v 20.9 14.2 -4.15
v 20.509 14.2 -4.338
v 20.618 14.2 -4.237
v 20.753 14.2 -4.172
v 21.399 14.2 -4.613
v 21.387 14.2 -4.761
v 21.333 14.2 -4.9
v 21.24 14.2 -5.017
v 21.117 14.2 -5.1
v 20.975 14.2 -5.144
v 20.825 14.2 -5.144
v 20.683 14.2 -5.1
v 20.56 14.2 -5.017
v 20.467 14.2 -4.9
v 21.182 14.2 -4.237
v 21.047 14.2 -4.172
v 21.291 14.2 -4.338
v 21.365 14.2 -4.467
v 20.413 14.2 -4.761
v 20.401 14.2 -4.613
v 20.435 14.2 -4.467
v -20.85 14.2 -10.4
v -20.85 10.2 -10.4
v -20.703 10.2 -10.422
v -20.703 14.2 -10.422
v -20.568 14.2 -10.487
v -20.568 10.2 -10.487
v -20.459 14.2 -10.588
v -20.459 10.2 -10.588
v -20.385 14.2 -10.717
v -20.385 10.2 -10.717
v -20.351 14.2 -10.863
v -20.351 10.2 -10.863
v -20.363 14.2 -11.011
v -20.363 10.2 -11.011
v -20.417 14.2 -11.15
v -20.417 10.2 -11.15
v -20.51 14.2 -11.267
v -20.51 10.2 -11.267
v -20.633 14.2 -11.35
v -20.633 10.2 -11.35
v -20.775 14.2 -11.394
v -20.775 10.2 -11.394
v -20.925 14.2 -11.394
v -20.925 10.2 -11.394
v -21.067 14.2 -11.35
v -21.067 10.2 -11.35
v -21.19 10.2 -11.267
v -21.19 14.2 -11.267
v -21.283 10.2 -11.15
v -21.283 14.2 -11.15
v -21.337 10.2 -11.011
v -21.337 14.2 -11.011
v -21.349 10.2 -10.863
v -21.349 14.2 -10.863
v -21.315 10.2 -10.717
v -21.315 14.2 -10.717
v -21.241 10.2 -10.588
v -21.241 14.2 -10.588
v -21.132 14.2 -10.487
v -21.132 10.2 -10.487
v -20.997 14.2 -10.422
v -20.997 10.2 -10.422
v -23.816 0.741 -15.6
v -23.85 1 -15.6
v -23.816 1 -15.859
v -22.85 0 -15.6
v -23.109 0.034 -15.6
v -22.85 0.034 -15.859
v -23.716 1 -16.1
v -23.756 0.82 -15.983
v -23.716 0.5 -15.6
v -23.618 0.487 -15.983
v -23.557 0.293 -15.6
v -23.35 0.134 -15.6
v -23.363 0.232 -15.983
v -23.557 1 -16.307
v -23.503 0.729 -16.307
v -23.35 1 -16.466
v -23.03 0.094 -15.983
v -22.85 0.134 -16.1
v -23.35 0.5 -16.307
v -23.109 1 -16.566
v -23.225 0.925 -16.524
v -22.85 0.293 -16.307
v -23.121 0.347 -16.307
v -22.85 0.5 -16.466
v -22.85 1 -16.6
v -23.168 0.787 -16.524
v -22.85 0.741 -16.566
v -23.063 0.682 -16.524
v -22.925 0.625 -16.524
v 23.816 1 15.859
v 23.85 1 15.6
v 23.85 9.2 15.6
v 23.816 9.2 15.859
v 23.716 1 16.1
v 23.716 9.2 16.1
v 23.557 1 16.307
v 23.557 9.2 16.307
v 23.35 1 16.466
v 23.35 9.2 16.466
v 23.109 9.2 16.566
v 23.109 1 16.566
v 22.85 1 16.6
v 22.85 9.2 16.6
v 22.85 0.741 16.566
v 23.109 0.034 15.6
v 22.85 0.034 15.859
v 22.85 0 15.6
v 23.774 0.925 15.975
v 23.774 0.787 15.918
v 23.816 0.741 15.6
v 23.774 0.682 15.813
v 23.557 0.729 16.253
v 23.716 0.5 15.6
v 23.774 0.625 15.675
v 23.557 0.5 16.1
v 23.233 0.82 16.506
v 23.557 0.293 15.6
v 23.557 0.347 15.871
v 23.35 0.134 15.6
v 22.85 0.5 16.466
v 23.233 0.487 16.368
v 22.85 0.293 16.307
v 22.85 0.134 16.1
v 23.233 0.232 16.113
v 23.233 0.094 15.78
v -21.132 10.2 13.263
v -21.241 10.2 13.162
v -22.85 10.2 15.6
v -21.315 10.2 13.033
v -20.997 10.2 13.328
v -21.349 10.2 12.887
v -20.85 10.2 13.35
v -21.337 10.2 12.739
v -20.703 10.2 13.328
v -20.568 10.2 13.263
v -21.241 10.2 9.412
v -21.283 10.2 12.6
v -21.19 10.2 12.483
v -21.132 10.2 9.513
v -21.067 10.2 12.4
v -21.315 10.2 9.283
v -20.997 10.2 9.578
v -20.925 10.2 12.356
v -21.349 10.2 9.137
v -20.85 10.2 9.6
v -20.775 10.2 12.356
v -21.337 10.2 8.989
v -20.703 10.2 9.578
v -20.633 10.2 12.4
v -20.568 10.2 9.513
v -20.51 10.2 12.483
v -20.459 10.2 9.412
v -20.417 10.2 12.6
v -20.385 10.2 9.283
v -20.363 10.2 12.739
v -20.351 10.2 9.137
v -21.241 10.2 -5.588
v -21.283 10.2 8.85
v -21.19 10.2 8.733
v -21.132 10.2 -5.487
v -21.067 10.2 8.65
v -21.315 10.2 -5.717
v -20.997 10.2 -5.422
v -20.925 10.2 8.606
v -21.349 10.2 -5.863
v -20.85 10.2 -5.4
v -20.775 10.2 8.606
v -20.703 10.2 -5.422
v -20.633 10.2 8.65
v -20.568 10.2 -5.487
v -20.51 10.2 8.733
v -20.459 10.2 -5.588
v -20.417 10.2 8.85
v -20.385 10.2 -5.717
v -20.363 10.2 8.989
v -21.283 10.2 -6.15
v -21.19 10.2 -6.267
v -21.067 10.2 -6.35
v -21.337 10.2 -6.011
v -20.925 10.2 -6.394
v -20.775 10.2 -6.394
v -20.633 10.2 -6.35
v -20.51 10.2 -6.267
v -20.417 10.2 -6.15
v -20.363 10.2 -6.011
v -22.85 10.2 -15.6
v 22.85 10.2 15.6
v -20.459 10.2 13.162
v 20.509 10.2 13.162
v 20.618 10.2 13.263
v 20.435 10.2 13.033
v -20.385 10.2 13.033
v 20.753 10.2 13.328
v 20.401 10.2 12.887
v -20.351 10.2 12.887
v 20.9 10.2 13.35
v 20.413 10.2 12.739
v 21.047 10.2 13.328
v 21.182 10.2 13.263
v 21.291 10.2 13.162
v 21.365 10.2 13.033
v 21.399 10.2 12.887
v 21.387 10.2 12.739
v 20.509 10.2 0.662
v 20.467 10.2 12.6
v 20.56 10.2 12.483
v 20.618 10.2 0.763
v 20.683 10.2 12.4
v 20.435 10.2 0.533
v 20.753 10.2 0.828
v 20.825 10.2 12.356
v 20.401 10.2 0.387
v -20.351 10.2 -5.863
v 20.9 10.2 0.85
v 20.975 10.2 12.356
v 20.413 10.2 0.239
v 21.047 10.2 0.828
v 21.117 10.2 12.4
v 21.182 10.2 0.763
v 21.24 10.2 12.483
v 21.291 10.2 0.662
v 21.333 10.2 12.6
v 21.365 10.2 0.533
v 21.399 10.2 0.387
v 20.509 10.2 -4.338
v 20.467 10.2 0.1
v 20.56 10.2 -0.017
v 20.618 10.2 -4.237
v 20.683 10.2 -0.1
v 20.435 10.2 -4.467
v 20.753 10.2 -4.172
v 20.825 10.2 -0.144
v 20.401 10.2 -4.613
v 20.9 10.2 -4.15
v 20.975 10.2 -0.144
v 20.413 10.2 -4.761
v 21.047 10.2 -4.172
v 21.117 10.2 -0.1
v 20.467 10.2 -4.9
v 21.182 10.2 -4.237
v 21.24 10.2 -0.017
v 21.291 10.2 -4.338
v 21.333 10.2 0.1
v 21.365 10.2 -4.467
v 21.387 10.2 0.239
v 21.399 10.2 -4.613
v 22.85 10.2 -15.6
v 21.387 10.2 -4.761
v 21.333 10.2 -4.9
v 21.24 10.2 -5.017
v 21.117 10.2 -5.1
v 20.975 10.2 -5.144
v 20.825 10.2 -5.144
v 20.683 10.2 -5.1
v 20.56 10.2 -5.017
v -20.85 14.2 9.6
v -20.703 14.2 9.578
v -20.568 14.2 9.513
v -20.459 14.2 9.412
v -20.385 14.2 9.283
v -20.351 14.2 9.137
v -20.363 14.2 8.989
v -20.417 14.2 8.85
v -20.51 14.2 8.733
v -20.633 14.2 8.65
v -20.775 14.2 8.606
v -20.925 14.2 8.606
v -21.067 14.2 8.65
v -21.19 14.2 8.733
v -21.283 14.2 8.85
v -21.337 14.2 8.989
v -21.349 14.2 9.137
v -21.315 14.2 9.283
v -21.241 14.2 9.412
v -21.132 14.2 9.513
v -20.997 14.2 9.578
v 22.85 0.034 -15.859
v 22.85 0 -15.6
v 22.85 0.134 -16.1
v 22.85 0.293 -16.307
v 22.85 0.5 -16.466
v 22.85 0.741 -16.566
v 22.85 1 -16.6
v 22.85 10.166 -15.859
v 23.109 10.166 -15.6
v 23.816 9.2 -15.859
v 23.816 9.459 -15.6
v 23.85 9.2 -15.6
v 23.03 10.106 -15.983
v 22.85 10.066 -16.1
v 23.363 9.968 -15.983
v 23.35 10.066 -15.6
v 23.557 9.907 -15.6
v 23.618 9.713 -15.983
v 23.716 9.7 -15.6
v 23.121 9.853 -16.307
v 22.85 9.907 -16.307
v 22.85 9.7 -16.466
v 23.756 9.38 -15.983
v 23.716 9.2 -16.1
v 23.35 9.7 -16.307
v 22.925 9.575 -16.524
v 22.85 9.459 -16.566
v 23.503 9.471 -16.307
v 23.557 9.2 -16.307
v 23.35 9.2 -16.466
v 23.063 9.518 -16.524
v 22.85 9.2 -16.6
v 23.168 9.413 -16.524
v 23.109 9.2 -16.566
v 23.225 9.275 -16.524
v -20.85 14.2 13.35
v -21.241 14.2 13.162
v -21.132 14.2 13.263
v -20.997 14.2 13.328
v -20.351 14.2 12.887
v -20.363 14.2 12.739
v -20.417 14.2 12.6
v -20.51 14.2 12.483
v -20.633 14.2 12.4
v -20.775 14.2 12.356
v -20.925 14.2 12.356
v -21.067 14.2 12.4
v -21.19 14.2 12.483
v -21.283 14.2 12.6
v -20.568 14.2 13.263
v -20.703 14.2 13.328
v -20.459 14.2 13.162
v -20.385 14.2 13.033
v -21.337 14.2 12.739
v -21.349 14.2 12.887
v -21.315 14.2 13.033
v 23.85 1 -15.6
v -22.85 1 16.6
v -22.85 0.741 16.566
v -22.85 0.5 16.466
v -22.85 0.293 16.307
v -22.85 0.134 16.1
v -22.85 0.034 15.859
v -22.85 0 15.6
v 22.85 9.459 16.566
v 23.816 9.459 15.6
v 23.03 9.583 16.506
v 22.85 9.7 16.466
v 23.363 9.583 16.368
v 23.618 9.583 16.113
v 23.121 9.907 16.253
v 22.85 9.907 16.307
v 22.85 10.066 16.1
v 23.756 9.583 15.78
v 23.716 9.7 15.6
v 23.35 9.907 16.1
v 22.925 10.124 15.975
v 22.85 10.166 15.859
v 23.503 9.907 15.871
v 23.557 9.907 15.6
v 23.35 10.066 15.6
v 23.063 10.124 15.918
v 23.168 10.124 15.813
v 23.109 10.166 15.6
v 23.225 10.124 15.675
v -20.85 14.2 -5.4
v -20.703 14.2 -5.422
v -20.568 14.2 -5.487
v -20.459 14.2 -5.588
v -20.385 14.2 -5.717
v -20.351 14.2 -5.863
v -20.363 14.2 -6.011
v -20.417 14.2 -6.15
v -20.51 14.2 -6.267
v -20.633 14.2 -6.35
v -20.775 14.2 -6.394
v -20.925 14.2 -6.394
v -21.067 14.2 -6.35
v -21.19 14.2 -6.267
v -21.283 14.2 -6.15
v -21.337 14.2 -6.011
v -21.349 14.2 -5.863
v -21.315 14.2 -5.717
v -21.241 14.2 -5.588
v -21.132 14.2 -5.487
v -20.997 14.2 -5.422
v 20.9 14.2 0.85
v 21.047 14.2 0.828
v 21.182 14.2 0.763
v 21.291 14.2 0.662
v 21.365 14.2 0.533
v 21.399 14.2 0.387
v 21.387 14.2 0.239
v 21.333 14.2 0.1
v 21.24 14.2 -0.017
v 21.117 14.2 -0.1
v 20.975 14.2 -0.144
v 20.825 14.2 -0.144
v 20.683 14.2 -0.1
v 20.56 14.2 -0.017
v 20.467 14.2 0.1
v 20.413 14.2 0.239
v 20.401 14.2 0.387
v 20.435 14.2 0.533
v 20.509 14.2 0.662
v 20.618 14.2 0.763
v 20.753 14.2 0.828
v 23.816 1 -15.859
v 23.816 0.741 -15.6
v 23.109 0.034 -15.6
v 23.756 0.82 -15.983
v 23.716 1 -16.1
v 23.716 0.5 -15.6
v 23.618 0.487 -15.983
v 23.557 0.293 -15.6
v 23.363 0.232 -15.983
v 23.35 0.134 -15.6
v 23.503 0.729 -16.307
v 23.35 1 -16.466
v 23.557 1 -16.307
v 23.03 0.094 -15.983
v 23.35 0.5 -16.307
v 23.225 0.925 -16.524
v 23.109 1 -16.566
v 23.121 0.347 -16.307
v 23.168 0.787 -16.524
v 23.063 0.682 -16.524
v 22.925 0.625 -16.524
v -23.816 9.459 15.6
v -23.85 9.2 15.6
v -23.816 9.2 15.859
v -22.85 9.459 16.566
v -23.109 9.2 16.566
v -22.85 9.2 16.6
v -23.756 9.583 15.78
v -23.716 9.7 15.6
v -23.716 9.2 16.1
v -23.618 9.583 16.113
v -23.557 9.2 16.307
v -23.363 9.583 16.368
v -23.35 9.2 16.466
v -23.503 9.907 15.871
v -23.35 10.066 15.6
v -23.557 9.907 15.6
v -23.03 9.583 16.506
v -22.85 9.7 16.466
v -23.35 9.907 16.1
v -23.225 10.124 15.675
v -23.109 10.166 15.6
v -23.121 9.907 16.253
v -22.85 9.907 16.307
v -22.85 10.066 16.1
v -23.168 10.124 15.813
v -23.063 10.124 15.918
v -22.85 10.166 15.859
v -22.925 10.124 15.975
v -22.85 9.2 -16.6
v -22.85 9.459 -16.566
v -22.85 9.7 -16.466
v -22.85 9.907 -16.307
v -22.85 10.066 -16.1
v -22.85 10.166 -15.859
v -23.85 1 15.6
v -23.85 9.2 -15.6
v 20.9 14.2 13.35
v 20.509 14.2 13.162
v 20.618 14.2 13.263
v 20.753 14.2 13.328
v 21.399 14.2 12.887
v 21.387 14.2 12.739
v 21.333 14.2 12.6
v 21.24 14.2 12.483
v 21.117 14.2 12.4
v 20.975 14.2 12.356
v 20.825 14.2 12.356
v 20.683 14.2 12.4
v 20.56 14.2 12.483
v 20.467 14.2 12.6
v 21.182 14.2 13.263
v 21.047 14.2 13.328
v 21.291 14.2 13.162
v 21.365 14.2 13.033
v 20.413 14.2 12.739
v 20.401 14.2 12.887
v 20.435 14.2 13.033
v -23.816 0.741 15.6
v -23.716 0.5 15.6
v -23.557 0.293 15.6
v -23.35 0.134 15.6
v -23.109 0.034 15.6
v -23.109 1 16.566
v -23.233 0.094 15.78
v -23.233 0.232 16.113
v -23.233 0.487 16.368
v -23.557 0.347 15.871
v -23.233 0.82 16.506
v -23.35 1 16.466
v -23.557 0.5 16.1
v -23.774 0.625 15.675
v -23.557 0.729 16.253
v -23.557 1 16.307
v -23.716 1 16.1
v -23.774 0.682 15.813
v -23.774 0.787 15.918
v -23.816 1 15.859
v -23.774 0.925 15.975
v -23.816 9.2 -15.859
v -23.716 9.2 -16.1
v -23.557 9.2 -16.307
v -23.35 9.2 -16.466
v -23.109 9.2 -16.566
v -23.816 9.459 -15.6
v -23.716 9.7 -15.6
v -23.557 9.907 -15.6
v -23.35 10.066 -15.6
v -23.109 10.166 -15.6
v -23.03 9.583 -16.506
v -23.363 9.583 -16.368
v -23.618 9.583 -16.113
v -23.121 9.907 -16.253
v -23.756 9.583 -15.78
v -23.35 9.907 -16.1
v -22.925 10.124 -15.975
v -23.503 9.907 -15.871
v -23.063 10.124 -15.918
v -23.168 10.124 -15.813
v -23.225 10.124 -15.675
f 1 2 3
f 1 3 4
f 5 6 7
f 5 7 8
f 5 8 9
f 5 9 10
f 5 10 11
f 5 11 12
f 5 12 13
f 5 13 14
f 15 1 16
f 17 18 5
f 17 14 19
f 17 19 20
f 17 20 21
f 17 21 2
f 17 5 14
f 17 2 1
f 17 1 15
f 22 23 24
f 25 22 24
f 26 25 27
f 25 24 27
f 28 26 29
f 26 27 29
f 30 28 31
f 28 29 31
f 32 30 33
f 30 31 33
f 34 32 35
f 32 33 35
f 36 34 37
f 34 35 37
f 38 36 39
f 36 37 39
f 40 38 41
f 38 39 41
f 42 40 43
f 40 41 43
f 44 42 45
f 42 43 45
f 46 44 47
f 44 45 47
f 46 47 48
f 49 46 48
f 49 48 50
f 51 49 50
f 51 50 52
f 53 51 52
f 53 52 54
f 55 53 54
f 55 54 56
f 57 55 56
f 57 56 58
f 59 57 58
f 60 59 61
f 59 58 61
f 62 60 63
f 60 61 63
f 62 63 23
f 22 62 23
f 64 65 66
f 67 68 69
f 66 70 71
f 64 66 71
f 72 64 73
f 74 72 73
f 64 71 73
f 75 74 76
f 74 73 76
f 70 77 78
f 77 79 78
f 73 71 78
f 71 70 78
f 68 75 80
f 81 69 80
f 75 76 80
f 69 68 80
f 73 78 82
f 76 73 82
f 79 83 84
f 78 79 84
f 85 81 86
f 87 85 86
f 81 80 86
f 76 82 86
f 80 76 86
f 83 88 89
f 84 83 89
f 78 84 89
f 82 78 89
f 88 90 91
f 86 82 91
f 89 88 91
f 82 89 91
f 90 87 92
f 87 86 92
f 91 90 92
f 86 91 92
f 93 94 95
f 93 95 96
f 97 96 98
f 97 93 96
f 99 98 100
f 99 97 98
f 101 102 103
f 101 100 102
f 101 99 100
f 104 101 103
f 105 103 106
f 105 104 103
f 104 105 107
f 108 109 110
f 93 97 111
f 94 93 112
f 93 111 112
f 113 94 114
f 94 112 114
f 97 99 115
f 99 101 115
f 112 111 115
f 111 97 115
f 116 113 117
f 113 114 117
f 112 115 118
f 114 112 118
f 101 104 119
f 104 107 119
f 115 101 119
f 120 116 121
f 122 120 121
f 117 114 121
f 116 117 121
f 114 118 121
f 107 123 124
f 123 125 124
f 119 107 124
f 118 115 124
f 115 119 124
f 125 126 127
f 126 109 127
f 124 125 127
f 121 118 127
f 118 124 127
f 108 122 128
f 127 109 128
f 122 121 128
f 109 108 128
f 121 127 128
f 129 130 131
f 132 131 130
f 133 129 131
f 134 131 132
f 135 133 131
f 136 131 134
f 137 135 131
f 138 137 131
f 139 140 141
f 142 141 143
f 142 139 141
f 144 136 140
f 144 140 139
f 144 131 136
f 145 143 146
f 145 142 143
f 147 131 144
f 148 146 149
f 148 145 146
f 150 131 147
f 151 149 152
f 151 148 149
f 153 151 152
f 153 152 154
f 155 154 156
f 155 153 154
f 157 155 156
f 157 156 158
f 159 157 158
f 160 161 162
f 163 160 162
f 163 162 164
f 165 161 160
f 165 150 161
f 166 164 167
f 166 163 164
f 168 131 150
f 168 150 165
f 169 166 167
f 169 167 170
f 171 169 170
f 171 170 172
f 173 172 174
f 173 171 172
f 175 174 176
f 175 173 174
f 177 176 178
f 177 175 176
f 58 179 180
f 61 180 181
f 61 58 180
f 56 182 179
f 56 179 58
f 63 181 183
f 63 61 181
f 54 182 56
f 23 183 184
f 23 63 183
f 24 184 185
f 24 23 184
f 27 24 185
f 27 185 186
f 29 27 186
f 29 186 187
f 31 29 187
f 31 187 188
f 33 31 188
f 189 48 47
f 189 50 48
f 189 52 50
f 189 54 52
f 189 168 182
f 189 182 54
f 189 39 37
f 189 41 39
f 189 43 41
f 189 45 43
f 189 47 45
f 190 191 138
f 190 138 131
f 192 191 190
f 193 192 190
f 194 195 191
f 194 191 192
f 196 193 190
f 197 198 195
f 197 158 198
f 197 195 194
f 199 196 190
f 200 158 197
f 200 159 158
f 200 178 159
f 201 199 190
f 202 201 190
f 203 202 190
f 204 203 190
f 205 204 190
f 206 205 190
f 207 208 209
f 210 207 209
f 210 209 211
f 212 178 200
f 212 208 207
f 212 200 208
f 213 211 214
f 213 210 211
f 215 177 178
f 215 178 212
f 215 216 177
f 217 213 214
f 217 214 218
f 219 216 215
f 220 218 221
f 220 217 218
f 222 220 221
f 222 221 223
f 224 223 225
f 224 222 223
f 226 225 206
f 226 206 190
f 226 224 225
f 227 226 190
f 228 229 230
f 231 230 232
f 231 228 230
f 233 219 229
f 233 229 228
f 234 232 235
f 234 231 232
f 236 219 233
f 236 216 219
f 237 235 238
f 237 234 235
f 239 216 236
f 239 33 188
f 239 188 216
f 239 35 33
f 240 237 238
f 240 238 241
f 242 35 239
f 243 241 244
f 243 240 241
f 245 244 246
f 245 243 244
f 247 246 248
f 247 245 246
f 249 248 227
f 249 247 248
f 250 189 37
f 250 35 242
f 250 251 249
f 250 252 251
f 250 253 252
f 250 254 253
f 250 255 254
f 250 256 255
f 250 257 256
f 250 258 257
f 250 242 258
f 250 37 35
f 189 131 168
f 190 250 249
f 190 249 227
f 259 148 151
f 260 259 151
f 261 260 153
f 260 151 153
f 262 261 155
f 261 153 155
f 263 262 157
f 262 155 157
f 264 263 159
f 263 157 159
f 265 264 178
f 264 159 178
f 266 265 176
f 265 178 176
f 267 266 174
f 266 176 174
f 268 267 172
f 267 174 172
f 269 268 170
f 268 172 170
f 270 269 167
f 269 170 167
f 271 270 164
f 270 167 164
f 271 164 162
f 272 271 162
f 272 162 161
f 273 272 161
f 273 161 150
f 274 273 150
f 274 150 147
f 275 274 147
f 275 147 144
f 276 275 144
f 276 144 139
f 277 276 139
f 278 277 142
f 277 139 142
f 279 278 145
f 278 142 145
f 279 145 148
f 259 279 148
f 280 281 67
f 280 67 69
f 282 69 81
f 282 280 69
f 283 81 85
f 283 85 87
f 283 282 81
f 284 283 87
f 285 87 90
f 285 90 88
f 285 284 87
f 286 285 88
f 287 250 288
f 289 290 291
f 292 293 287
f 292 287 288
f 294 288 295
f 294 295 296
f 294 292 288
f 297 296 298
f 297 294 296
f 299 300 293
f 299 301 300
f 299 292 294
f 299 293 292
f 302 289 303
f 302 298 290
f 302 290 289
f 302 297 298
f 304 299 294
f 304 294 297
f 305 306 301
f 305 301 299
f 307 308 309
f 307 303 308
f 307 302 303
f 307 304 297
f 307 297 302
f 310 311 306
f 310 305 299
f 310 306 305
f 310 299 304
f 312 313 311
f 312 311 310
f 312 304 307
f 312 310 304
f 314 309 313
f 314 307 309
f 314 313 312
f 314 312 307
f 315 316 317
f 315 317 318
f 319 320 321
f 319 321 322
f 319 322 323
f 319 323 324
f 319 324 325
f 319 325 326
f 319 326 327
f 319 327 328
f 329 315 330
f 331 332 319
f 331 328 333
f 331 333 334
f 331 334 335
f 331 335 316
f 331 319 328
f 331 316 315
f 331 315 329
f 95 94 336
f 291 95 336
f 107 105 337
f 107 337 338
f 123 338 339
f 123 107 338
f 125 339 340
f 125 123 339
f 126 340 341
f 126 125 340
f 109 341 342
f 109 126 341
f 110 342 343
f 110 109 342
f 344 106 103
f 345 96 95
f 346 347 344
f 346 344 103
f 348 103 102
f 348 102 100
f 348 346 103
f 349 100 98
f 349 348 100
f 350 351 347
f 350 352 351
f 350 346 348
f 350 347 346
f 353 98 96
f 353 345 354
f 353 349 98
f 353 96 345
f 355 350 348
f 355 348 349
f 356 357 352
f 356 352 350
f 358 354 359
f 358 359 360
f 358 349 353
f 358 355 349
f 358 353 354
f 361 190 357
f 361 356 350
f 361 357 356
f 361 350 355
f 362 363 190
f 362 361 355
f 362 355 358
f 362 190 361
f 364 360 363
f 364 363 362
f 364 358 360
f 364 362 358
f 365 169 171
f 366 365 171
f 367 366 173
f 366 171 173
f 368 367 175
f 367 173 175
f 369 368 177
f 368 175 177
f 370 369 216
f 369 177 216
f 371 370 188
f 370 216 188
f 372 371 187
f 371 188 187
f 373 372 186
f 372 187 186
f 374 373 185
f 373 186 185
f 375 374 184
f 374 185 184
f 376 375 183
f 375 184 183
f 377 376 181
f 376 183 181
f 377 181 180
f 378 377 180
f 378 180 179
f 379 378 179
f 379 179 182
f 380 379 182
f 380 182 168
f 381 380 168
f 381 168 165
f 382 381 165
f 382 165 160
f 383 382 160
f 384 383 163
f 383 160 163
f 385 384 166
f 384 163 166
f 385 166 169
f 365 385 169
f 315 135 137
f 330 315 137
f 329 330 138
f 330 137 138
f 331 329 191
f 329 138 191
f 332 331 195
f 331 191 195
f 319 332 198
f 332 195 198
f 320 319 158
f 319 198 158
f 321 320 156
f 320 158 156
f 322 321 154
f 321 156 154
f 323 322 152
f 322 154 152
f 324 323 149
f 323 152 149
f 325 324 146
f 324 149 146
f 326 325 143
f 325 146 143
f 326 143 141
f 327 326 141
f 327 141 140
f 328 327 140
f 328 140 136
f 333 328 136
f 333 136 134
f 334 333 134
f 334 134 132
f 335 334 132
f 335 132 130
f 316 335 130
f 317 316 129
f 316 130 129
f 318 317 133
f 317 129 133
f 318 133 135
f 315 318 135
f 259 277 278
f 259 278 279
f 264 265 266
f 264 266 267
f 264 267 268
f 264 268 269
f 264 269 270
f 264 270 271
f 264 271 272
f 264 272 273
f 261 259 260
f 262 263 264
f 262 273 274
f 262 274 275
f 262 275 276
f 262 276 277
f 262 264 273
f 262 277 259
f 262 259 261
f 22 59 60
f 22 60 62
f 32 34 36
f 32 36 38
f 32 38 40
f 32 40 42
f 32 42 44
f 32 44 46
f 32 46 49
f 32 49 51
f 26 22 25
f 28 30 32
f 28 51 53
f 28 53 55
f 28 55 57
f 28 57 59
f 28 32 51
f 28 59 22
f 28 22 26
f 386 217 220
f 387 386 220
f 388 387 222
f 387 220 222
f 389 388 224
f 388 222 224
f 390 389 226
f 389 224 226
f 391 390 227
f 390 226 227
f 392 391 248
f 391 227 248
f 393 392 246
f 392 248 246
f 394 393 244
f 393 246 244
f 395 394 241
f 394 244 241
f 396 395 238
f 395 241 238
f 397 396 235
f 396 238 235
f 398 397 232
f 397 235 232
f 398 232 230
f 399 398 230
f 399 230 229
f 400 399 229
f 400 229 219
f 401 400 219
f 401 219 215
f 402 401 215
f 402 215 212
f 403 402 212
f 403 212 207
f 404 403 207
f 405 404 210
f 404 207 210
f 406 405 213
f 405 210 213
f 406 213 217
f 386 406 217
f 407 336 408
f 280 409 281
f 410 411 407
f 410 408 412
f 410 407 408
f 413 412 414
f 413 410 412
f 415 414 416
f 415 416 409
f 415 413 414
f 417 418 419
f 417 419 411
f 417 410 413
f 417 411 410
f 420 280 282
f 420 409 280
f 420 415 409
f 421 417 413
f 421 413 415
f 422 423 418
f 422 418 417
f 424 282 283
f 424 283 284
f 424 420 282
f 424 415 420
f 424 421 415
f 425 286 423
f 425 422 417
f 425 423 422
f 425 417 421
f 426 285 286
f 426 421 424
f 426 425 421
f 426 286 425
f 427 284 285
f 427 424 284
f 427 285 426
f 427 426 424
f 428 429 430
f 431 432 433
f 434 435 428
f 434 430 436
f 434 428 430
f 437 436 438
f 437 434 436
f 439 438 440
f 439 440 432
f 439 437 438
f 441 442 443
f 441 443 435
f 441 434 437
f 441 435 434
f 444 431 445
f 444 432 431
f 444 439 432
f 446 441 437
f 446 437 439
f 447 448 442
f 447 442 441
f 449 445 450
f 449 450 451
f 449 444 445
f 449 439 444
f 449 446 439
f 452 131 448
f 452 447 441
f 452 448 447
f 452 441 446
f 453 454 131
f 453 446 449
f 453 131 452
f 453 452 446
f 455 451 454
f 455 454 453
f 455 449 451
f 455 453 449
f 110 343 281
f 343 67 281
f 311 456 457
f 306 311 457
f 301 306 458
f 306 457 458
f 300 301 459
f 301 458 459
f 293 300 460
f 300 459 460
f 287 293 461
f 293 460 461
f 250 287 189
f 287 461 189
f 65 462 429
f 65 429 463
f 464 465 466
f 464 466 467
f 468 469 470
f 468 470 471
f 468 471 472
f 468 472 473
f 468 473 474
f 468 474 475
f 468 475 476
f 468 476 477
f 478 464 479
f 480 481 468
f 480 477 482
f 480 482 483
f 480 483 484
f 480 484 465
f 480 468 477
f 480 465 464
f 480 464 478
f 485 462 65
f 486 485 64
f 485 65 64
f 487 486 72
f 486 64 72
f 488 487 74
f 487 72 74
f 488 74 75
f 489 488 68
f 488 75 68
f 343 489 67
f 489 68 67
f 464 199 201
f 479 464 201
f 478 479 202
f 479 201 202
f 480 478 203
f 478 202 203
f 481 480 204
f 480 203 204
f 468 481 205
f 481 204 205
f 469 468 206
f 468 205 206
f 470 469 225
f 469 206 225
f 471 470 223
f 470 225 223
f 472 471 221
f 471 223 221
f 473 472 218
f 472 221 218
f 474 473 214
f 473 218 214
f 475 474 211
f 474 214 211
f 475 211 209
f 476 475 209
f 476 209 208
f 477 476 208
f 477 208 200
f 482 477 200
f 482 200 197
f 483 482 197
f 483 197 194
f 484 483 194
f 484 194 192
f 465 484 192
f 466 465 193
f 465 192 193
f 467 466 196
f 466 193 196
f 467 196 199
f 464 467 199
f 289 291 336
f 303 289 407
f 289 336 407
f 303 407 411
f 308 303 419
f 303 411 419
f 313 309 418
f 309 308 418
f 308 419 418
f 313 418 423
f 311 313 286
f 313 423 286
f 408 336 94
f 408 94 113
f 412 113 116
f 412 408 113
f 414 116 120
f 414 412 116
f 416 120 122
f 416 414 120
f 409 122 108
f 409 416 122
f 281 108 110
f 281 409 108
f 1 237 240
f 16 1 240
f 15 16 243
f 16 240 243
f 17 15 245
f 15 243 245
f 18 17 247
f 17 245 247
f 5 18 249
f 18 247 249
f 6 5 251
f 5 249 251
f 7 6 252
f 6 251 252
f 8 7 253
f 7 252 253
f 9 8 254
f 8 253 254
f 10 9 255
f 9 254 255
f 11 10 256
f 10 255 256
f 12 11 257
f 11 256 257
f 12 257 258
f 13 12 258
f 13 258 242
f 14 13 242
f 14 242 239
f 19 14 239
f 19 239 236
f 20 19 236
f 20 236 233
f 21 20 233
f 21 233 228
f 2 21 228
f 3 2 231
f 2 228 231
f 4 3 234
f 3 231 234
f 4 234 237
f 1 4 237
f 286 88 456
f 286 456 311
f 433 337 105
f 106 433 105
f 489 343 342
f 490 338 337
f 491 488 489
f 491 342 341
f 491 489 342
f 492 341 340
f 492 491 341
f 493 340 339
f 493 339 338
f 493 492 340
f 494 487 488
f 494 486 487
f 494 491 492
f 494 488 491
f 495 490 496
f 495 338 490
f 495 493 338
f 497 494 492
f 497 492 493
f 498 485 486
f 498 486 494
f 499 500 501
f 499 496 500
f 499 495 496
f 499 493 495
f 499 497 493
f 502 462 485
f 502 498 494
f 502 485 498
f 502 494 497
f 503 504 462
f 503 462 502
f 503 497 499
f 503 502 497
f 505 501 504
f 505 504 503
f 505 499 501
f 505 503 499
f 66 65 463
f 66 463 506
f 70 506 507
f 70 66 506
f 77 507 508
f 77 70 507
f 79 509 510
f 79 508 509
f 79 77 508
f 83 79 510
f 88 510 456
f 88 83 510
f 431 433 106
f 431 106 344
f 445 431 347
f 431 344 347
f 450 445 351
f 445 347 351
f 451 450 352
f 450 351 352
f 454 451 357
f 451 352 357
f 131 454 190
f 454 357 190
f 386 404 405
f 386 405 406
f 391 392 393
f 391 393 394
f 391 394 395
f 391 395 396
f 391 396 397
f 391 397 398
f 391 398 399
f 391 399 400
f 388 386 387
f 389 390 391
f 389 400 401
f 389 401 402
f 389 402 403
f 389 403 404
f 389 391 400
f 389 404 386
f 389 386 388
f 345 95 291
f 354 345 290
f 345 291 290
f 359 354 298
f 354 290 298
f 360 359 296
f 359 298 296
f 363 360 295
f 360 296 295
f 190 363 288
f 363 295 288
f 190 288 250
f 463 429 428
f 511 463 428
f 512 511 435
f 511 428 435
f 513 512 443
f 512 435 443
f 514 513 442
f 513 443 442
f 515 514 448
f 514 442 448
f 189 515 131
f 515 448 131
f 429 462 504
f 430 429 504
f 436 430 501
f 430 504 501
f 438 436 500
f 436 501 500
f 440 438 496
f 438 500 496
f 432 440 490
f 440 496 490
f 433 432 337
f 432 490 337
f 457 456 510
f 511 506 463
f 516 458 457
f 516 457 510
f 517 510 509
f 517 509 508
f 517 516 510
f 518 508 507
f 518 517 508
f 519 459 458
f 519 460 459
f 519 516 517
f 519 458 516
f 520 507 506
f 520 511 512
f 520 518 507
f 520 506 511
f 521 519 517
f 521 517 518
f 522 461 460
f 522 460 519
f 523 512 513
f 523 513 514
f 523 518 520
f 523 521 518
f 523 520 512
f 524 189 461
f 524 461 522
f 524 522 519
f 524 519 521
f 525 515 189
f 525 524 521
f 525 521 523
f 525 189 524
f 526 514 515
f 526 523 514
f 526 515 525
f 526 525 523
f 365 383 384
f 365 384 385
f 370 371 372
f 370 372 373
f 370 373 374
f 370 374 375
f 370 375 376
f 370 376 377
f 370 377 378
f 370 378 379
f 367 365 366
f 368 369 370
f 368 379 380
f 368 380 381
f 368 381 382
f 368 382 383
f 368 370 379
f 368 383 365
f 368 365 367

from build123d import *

# Parameters (mm, degrees)
SKETCH_1_W      = 47.7
SKETCH_1_H      = 33.2
EXTRUDE_1_DEPTH = 10.2
SKETCH_2_R      = 0.5
EXTRUDE_2_DEPTH = 4
FILLET_1_R      = 1
FILLET_2_R      = 1
FILLET_3_R      = 1
FILLET_4_R      = 1


with BuildPart() as part:
    # Эскиз1 → Бобышка-Вытянуть1 (new body)
    with BuildSketch(Plane(origin=(0, 0, 0), x_dir=(1, 0, 0), z_dir=(0, 1, 0))):
        Rectangle(SKETCH_1_W, SKETCH_1_H)
    extrude(amount=EXTRUDE_1_DEPTH)

    # Эскиз2 → Бобышка-Вытянуть2 (add)
    with BuildSketch(Plane(origin=(0, 10.2, 0), x_dir=(1, 0, 0), z_dir=(0, 1, 0))):
        with Locations(Location((-20.85, 5.9, 0), (0, 0, 270))):
            Circle(SKETCH_2_R)
        with Locations(Location((-20.85, 10.9, 0), (0, 0, 270))):
            Circle(SKETCH_2_R)
        with Locations(Location((-20.85, -12.85, 0), (0, 0, 270))):
            Circle(SKETCH_2_R)
        with Locations(Location((-20.85, -9.1, 0), (0, 0, 270))):
            Circle(SKETCH_2_R)
        with Locations(Location((20.9, -12.85, 0), (0, 0, 270))):
            Circle(SKETCH_2_R)
        with Locations(Location((20.9, -0.35, 0), (0, 0, 270))):
            Circle(SKETCH_2_R)
        with Locations(Location((20.9, 4.65, 0), (0, 0, 270))):
            Circle(SKETCH_2_R)
    extrude(amount=EXTRUDE_2_DEPTH)

    # Скругление1
    fillet_1_edges = [part.edges().sort_by_distance(p)[0] for p in [
        (0, 0, 16.6),
        (-23.85, 0, 0),
    ]]
    fillet(fillet_1_edges, radius=FILLET_1_R)

    # Скругление2
    fillet_2_edges = [part.edges().sort_by_distance(p)[0] for p in [
        (23.85, 0, -0.5),
        (-23.557106781, 0.292893219, -16.6),
        (23.85, 0.292893219, 16.307106781),
        (0.5, 0, -16.6),
        (23.85, 5.6, 16.6),
        (-23.85, 5.6, -16.6),
    ]]
    fillet(fillet_2_edges, radius=FILLET_2_R)

    # Скругление3
    # the kernel refuses this fillet: 1 mm, written as the material it takes off along each edge
    with BuildSketch(Plane(origin=(-22.85, 1, 15.6), x_dir=(0, 0, 1), z_dir=(-1, 0, 0))) as fillet_3_piece_1_section:
        Polygon((0, 0), (FILLET_3_R, 0), (FILLET_3_R, -FILLET_3_R), (0, -FILLET_3_R), align=None)
    fillet_3_piece_1 = extrude(amount=FILLET_3_R, mode=Mode.PRIVATE)
    fillet_3_piece_1 = fillet_3_piece_1 - Plane(origin=(-22.85, 1, 15.6), x_dir=(0, 0.7071067811865475, -0.7071067811865475), z_dir=(-1, 0, 0)) * Sphere(FILLET_3_R, mode=Mode.PRIVATE)
    add(fillet_3_piece_1, mode=Mode.SUBTRACT)
    with BuildSketch(Plane(origin=(-22.85, 9.2, 15.6), x_dir=(-1, 0, 0), z_dir=(0, 1, 0))) as fillet_3_piece_2_section:
        Polygon((0, 0), (FILLET_3_R, 0), (FILLET_3_R, FILLET_3_R), (0, FILLET_3_R), align=None)
    fillet_3_piece_2 = extrude(amount=FILLET_3_R, mode=Mode.PRIVATE)
    fillet_3_piece_2 = fillet_3_piece_2 - Plane(origin=(-22.85, 9.2, 15.6), x_dir=(0.7071067811865475, 0, -0.7071067811865475), z_dir=(0, 1, 0)) * Sphere(FILLET_3_R, mode=Mode.PRIVATE)
    add(fillet_3_piece_2, mode=Mode.SUBTRACT)
    with BuildSketch(Plane(origin=(22.85, 10.2, 16.6), x_dir=(0, 0, -1), z_dir=(-1, 0, 0))) as fillet_3_piece_3:
        with BuildLine():
            CenterArc((FILLET_3_R, FILLET_3_R), FILLET_3_R, 180, 90)
            Line((0, FILLET_3_R), (0, 0))
            Line((0, 0), (FILLET_3_R, 0))
        make_face()
    extrude(amount=45.7, mode=Mode.SUBTRACT)
    with BuildSketch(Plane(origin=(23.85, 10.2, -19.1), x_dir=(-1, 0, 0), z_dir=(0, 0, 1))) as fillet_3_piece_4:
        with BuildLine():
            CenterArc((FILLET_3_R, FILLET_3_R), FILLET_3_R, 180, 90)
            Line((0, FILLET_3_R), (0, 0))
            Line((0, 0), (FILLET_3_R, 0))
        make_face()
    extrude(amount=34.7, mode=Mode.SUBTRACT)
    with BuildSketch(Plane(origin=(-23.85, 10.2, 15.6), x_dir=(1, 0, 0), z_dir=(0, 0, -1))) as fillet_3_piece_5:
        with BuildLine():
            CenterArc((FILLET_3_R, FILLET_3_R), FILLET_3_R, 180, 90)
            Line((0, FILLET_3_R), (0, 0))
            Line((0, 0), (FILLET_3_R, 0))
        make_face()
    extrude(amount=31.2, mode=Mode.SUBTRACT)
    with BuildSketch(Plane(origin=(-22.85, 10.2, -15.6), x_dir=(0, 0, -1), z_dir=(1, 0, 0))) as fillet_3_piece_6:
        with BuildLine():
            CenterArc((1 - FILLET_3_R, -FILLET_3_R), FILLET_3_R, 0, 90)
            Line((1, -FILLET_3_R), (1, 0))
            Line((1, 0), (1 - FILLET_3_R, 0))
        make_face()
    revolve(axis=Axis((-22.85, 10.2, -15.6), (0, 1, 0)), revolution_arc=90, mode=Mode.SUBTRACT)
    with BuildSketch(Plane(origin=(22.85, 10.2, 15.6), x_dir=(0, 0, 1), z_dir=(-1, 0, 0))) as fillet_3_piece_7:
        with BuildLine():
            CenterArc((1 - FILLET_3_R, -FILLET_3_R), FILLET_3_R, 0, 90)
            Line((1, -FILLET_3_R), (1, 0))
            Line((1, 0), (1 - FILLET_3_R, 0))
        make_face()
    revolve(axis=Axis((22.85, 10.2, 15.6), (0, 1, 0)), revolution_arc=90, mode=Mode.SUBTRACT)
    with BuildSketch(Plane(origin=(-22.85, 10.2, -16.6), x_dir=(0, -1, 0), z_dir=(1, 0, 0))) as fillet_3_piece_8:
        with BuildLine():
            CenterArc((FILLET_3_R, -FILLET_3_R), FILLET_3_R, 90, 90)
            Line((0, -FILLET_3_R), (0, 0))
            Line((0, 0), (FILLET_3_R, 0))
        make_face()
    extrude(amount=49.2, mode=Mode.SUBTRACT)
    with BuildSketch(Plane(origin=(-23.85, 1, 16.6), x_dir=(0, 0, -1), z_dir=(0, 1, 0))) as fillet_3_piece_9:
        with BuildLine():
            CenterArc((FILLET_3_R, -FILLET_3_R), FILLET_3_R, 90, 90)
            Line((0, -FILLET_3_R), (0, 0))
            Line((0, 0), (FILLET_3_R, 0))
        make_face()
    extrude(amount=8.2, mode=Mode.SUBTRACT)

    # Скругление4
    # the kernel refuses this fillet: 1 mm, written as the material it takes off along each edge
    with BuildSketch(Plane(origin=(22.85, 1, -15.6), x_dir=(1, 0, 0), z_dir=(0, 0, -1))) as fillet_4_piece_1_section:
        Polygon((0, 0), (FILLET_4_R, 0), (FILLET_4_R, FILLET_4_R), (0, FILLET_4_R), align=None)
    fillet_4_piece_1 = extrude(amount=FILLET_4_R, mode=Mode.PRIVATE)
    fillet_4_piece_1 = fillet_4_piece_1 - Plane(origin=(22.85, 1, -15.6), x_dir=(-0.7071067811865475, 0.7071067811865475, 0), z_dir=(0, 0, -1)) * Sphere(FILLET_4_R, mode=Mode.PRIVATE)
    add(fillet_4_piece_1, mode=Mode.SUBTRACT)
    with BuildSketch(Plane(origin=(22.85, 9.2, -15.6), x_dir=(1, 0, 0), z_dir=(0, 0, -1))) as fillet_4_piece_2_section:
        Polygon((0, 0), (FILLET_4_R, 0), (FILLET_4_R, -FILLET_4_R), (0, -FILLET_4_R), align=None)
    fillet_4_piece_2 = extrude(amount=FILLET_4_R, mode=Mode.PRIVATE)
    fillet_4_piece_2 = fillet_4_piece_2 - Plane(origin=(22.85, 9.2, -15.6), x_dir=(-0.7071067811865475, -0.7071067811865475, 0), z_dir=(0, 0, -1)) * Sphere(FILLET_4_R, mode=Mode.PRIVATE)
    add(fillet_4_piece_2, mode=Mode.SUBTRACT)
    with BuildSketch(Plane(origin=(23.85, 1, -16.6), x_dir=(-1, 0, 0), z_dir=(0, 1, 0))) as fillet_4_piece_3:
        with BuildLine():
            CenterArc((FILLET_4_R, FILLET_4_R), FILLET_4_R, 180, 90)
            Line((0, FILLET_4_R), (0, 0))
            Line((0, 0), (FILLET_4_R, 0))
        make_face()
    extrude(amount=8.2, mode=Mode.SUBTRACT)


solid = part.part
